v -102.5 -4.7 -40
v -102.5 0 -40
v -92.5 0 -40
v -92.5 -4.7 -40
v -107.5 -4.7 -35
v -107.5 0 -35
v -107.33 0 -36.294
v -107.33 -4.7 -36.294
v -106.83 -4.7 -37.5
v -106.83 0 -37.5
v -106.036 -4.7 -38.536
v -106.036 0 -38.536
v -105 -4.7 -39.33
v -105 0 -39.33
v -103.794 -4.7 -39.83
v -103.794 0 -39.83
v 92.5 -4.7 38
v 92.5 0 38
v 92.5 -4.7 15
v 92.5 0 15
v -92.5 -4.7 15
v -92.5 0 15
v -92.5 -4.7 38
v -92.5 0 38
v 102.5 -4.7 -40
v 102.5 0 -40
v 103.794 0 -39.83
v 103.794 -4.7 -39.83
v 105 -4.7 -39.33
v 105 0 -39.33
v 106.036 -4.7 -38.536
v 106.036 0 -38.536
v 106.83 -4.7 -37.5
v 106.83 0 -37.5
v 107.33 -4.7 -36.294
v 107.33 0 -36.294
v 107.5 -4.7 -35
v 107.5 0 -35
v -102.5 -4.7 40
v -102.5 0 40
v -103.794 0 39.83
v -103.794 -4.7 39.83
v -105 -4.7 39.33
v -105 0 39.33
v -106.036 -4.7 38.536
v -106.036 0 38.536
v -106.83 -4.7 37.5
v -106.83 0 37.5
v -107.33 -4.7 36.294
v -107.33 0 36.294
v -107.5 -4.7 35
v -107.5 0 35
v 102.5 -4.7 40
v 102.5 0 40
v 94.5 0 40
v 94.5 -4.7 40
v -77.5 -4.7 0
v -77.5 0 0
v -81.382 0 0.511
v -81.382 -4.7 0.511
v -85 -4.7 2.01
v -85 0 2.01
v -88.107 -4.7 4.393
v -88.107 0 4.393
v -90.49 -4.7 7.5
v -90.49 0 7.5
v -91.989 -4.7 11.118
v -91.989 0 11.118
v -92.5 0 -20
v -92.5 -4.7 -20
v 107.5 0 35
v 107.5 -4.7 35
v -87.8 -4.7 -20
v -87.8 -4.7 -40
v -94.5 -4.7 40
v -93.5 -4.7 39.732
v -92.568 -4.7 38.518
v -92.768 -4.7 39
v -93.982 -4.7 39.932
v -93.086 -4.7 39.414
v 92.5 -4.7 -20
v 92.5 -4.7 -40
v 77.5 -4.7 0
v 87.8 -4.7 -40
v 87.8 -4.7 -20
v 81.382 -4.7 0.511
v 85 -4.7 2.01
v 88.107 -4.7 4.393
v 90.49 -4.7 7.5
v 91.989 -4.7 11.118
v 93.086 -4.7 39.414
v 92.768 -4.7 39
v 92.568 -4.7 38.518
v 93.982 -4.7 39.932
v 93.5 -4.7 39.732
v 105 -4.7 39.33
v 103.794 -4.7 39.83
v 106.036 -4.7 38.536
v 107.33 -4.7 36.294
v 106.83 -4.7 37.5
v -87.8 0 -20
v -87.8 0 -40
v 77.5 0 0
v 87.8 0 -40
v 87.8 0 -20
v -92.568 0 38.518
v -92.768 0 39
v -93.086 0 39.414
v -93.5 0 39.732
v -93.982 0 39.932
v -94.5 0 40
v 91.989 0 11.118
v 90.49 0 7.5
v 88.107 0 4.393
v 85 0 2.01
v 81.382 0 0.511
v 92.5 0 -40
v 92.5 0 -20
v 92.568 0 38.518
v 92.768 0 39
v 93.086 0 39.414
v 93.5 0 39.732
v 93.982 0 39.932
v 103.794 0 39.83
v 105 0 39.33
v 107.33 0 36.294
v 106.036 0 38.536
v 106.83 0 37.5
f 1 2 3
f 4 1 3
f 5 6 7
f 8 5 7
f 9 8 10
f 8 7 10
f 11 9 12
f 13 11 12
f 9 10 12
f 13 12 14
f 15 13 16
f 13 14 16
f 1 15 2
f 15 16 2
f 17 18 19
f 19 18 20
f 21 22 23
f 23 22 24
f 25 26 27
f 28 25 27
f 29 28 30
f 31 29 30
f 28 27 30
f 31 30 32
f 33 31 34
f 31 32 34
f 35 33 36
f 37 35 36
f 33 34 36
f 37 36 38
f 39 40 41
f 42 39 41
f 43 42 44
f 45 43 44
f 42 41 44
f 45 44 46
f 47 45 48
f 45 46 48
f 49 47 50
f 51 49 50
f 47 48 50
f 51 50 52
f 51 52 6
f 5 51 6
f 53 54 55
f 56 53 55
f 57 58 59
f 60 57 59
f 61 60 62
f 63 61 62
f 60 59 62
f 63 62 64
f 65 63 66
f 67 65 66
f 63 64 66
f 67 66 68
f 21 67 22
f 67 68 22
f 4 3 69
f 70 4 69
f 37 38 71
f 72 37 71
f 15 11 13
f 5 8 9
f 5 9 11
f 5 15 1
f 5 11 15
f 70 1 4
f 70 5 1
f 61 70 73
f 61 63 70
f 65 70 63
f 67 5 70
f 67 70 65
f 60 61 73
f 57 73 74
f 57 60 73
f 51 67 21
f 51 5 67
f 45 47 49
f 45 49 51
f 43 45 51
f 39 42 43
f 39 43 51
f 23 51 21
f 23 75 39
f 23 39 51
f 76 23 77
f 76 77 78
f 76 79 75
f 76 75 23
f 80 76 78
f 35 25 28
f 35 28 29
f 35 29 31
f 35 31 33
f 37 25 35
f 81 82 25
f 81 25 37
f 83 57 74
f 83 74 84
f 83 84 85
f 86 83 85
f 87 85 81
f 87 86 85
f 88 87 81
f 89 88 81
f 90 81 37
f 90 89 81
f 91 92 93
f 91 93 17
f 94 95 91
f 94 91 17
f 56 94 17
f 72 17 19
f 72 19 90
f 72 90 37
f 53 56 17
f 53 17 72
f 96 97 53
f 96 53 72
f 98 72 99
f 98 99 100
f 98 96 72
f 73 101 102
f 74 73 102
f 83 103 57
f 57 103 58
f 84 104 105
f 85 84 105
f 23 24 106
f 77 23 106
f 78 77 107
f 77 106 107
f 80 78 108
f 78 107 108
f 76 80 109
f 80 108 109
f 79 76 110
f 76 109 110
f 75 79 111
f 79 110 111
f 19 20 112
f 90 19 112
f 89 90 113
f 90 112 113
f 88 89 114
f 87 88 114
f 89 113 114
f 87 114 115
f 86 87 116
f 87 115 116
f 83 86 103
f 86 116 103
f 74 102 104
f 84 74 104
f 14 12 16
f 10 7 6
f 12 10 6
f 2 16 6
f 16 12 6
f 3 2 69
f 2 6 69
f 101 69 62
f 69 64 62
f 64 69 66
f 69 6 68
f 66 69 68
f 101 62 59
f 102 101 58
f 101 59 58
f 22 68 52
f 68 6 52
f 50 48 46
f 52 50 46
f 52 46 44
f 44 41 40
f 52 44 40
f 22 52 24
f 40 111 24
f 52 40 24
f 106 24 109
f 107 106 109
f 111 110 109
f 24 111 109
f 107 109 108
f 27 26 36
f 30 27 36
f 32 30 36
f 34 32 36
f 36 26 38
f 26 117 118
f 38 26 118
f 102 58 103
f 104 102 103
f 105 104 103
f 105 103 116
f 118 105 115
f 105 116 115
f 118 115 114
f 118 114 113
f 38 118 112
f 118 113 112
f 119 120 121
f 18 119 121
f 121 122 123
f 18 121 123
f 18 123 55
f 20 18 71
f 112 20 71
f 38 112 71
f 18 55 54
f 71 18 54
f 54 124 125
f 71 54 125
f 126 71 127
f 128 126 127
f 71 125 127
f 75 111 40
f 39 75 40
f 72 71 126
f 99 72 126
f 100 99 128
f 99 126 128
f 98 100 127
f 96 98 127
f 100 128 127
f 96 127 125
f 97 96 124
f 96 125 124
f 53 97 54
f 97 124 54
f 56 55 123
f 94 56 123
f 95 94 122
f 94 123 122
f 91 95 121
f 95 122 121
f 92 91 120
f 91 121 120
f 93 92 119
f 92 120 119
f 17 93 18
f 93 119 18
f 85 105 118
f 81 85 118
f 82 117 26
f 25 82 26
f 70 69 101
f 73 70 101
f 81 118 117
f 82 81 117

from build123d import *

# Parameters (mm, degrees)
F2_DEPTH = 4.7


with BuildPart() as f2:
    # F1 (on Front) → F2 (new body)
    with BuildSketch(Plane.XZ):
        with BuildLine():
            Line((-92.5, 15), (-92.5, 38))
            ThreePointArc((-92.5, 38), (-93.0857864376, 39.4142135624), (-94.5, 40))
            Line((-94.5, 40), (-102.5, 40))
            ThreePointArc((-102.5, 40), (-106.0355339059, 38.5355339059), (-107.5, 35))
            Line((-107.5, 35), (-107.5, -35))
            ThreePointArc((-107.5, -35), (-106.0355339059, -38.5355339059), (-102.5, -40))
            Line((-102.5, -40), (-92.5, -40))
            Line((-92.5, -40), (-92.5, -20))
            Line((-92.5, -20), (-87.8, -20))
            Line((-87.8, -20), (-87.8, -40))
            Line((-87.8, -40), (87.8, -40))
            Line((87.8, -40), (87.8, -20))
            Line((87.8, -20), (92.5, -20))
            Line((92.5, -20), (92.5, -40))
            Line((92.5, -40), (102.5, -40))
            ThreePointArc((102.5, -40), (106.0355339059, -38.5355339059), (107.5, -35))
            Line((107.5, -35), (107.5, 35))
            ThreePointArc((107.5, 35), (106.0355339059, 38.5355339059), (102.5, 40))
            Line((102.5, 40), (94.5, 40))
            ThreePointArc((94.5, 40), (93.0857864376, 39.4142135624), (92.5, 38))
            Line((92.5, 38), (92.5, 15))
            ThreePointArc((92.5, 15), (88.1066017178, 4.3933982822), (77.5, 0))
            Line((77.5, 0), (-77.5, 0))
            ThreePointArc((-77.5, 0), (-88.1066017178, 4.3933982822), (-92.5, 15))
        make_face()
    extrude(amount=F2_DEPTH)


solid = f2.part
